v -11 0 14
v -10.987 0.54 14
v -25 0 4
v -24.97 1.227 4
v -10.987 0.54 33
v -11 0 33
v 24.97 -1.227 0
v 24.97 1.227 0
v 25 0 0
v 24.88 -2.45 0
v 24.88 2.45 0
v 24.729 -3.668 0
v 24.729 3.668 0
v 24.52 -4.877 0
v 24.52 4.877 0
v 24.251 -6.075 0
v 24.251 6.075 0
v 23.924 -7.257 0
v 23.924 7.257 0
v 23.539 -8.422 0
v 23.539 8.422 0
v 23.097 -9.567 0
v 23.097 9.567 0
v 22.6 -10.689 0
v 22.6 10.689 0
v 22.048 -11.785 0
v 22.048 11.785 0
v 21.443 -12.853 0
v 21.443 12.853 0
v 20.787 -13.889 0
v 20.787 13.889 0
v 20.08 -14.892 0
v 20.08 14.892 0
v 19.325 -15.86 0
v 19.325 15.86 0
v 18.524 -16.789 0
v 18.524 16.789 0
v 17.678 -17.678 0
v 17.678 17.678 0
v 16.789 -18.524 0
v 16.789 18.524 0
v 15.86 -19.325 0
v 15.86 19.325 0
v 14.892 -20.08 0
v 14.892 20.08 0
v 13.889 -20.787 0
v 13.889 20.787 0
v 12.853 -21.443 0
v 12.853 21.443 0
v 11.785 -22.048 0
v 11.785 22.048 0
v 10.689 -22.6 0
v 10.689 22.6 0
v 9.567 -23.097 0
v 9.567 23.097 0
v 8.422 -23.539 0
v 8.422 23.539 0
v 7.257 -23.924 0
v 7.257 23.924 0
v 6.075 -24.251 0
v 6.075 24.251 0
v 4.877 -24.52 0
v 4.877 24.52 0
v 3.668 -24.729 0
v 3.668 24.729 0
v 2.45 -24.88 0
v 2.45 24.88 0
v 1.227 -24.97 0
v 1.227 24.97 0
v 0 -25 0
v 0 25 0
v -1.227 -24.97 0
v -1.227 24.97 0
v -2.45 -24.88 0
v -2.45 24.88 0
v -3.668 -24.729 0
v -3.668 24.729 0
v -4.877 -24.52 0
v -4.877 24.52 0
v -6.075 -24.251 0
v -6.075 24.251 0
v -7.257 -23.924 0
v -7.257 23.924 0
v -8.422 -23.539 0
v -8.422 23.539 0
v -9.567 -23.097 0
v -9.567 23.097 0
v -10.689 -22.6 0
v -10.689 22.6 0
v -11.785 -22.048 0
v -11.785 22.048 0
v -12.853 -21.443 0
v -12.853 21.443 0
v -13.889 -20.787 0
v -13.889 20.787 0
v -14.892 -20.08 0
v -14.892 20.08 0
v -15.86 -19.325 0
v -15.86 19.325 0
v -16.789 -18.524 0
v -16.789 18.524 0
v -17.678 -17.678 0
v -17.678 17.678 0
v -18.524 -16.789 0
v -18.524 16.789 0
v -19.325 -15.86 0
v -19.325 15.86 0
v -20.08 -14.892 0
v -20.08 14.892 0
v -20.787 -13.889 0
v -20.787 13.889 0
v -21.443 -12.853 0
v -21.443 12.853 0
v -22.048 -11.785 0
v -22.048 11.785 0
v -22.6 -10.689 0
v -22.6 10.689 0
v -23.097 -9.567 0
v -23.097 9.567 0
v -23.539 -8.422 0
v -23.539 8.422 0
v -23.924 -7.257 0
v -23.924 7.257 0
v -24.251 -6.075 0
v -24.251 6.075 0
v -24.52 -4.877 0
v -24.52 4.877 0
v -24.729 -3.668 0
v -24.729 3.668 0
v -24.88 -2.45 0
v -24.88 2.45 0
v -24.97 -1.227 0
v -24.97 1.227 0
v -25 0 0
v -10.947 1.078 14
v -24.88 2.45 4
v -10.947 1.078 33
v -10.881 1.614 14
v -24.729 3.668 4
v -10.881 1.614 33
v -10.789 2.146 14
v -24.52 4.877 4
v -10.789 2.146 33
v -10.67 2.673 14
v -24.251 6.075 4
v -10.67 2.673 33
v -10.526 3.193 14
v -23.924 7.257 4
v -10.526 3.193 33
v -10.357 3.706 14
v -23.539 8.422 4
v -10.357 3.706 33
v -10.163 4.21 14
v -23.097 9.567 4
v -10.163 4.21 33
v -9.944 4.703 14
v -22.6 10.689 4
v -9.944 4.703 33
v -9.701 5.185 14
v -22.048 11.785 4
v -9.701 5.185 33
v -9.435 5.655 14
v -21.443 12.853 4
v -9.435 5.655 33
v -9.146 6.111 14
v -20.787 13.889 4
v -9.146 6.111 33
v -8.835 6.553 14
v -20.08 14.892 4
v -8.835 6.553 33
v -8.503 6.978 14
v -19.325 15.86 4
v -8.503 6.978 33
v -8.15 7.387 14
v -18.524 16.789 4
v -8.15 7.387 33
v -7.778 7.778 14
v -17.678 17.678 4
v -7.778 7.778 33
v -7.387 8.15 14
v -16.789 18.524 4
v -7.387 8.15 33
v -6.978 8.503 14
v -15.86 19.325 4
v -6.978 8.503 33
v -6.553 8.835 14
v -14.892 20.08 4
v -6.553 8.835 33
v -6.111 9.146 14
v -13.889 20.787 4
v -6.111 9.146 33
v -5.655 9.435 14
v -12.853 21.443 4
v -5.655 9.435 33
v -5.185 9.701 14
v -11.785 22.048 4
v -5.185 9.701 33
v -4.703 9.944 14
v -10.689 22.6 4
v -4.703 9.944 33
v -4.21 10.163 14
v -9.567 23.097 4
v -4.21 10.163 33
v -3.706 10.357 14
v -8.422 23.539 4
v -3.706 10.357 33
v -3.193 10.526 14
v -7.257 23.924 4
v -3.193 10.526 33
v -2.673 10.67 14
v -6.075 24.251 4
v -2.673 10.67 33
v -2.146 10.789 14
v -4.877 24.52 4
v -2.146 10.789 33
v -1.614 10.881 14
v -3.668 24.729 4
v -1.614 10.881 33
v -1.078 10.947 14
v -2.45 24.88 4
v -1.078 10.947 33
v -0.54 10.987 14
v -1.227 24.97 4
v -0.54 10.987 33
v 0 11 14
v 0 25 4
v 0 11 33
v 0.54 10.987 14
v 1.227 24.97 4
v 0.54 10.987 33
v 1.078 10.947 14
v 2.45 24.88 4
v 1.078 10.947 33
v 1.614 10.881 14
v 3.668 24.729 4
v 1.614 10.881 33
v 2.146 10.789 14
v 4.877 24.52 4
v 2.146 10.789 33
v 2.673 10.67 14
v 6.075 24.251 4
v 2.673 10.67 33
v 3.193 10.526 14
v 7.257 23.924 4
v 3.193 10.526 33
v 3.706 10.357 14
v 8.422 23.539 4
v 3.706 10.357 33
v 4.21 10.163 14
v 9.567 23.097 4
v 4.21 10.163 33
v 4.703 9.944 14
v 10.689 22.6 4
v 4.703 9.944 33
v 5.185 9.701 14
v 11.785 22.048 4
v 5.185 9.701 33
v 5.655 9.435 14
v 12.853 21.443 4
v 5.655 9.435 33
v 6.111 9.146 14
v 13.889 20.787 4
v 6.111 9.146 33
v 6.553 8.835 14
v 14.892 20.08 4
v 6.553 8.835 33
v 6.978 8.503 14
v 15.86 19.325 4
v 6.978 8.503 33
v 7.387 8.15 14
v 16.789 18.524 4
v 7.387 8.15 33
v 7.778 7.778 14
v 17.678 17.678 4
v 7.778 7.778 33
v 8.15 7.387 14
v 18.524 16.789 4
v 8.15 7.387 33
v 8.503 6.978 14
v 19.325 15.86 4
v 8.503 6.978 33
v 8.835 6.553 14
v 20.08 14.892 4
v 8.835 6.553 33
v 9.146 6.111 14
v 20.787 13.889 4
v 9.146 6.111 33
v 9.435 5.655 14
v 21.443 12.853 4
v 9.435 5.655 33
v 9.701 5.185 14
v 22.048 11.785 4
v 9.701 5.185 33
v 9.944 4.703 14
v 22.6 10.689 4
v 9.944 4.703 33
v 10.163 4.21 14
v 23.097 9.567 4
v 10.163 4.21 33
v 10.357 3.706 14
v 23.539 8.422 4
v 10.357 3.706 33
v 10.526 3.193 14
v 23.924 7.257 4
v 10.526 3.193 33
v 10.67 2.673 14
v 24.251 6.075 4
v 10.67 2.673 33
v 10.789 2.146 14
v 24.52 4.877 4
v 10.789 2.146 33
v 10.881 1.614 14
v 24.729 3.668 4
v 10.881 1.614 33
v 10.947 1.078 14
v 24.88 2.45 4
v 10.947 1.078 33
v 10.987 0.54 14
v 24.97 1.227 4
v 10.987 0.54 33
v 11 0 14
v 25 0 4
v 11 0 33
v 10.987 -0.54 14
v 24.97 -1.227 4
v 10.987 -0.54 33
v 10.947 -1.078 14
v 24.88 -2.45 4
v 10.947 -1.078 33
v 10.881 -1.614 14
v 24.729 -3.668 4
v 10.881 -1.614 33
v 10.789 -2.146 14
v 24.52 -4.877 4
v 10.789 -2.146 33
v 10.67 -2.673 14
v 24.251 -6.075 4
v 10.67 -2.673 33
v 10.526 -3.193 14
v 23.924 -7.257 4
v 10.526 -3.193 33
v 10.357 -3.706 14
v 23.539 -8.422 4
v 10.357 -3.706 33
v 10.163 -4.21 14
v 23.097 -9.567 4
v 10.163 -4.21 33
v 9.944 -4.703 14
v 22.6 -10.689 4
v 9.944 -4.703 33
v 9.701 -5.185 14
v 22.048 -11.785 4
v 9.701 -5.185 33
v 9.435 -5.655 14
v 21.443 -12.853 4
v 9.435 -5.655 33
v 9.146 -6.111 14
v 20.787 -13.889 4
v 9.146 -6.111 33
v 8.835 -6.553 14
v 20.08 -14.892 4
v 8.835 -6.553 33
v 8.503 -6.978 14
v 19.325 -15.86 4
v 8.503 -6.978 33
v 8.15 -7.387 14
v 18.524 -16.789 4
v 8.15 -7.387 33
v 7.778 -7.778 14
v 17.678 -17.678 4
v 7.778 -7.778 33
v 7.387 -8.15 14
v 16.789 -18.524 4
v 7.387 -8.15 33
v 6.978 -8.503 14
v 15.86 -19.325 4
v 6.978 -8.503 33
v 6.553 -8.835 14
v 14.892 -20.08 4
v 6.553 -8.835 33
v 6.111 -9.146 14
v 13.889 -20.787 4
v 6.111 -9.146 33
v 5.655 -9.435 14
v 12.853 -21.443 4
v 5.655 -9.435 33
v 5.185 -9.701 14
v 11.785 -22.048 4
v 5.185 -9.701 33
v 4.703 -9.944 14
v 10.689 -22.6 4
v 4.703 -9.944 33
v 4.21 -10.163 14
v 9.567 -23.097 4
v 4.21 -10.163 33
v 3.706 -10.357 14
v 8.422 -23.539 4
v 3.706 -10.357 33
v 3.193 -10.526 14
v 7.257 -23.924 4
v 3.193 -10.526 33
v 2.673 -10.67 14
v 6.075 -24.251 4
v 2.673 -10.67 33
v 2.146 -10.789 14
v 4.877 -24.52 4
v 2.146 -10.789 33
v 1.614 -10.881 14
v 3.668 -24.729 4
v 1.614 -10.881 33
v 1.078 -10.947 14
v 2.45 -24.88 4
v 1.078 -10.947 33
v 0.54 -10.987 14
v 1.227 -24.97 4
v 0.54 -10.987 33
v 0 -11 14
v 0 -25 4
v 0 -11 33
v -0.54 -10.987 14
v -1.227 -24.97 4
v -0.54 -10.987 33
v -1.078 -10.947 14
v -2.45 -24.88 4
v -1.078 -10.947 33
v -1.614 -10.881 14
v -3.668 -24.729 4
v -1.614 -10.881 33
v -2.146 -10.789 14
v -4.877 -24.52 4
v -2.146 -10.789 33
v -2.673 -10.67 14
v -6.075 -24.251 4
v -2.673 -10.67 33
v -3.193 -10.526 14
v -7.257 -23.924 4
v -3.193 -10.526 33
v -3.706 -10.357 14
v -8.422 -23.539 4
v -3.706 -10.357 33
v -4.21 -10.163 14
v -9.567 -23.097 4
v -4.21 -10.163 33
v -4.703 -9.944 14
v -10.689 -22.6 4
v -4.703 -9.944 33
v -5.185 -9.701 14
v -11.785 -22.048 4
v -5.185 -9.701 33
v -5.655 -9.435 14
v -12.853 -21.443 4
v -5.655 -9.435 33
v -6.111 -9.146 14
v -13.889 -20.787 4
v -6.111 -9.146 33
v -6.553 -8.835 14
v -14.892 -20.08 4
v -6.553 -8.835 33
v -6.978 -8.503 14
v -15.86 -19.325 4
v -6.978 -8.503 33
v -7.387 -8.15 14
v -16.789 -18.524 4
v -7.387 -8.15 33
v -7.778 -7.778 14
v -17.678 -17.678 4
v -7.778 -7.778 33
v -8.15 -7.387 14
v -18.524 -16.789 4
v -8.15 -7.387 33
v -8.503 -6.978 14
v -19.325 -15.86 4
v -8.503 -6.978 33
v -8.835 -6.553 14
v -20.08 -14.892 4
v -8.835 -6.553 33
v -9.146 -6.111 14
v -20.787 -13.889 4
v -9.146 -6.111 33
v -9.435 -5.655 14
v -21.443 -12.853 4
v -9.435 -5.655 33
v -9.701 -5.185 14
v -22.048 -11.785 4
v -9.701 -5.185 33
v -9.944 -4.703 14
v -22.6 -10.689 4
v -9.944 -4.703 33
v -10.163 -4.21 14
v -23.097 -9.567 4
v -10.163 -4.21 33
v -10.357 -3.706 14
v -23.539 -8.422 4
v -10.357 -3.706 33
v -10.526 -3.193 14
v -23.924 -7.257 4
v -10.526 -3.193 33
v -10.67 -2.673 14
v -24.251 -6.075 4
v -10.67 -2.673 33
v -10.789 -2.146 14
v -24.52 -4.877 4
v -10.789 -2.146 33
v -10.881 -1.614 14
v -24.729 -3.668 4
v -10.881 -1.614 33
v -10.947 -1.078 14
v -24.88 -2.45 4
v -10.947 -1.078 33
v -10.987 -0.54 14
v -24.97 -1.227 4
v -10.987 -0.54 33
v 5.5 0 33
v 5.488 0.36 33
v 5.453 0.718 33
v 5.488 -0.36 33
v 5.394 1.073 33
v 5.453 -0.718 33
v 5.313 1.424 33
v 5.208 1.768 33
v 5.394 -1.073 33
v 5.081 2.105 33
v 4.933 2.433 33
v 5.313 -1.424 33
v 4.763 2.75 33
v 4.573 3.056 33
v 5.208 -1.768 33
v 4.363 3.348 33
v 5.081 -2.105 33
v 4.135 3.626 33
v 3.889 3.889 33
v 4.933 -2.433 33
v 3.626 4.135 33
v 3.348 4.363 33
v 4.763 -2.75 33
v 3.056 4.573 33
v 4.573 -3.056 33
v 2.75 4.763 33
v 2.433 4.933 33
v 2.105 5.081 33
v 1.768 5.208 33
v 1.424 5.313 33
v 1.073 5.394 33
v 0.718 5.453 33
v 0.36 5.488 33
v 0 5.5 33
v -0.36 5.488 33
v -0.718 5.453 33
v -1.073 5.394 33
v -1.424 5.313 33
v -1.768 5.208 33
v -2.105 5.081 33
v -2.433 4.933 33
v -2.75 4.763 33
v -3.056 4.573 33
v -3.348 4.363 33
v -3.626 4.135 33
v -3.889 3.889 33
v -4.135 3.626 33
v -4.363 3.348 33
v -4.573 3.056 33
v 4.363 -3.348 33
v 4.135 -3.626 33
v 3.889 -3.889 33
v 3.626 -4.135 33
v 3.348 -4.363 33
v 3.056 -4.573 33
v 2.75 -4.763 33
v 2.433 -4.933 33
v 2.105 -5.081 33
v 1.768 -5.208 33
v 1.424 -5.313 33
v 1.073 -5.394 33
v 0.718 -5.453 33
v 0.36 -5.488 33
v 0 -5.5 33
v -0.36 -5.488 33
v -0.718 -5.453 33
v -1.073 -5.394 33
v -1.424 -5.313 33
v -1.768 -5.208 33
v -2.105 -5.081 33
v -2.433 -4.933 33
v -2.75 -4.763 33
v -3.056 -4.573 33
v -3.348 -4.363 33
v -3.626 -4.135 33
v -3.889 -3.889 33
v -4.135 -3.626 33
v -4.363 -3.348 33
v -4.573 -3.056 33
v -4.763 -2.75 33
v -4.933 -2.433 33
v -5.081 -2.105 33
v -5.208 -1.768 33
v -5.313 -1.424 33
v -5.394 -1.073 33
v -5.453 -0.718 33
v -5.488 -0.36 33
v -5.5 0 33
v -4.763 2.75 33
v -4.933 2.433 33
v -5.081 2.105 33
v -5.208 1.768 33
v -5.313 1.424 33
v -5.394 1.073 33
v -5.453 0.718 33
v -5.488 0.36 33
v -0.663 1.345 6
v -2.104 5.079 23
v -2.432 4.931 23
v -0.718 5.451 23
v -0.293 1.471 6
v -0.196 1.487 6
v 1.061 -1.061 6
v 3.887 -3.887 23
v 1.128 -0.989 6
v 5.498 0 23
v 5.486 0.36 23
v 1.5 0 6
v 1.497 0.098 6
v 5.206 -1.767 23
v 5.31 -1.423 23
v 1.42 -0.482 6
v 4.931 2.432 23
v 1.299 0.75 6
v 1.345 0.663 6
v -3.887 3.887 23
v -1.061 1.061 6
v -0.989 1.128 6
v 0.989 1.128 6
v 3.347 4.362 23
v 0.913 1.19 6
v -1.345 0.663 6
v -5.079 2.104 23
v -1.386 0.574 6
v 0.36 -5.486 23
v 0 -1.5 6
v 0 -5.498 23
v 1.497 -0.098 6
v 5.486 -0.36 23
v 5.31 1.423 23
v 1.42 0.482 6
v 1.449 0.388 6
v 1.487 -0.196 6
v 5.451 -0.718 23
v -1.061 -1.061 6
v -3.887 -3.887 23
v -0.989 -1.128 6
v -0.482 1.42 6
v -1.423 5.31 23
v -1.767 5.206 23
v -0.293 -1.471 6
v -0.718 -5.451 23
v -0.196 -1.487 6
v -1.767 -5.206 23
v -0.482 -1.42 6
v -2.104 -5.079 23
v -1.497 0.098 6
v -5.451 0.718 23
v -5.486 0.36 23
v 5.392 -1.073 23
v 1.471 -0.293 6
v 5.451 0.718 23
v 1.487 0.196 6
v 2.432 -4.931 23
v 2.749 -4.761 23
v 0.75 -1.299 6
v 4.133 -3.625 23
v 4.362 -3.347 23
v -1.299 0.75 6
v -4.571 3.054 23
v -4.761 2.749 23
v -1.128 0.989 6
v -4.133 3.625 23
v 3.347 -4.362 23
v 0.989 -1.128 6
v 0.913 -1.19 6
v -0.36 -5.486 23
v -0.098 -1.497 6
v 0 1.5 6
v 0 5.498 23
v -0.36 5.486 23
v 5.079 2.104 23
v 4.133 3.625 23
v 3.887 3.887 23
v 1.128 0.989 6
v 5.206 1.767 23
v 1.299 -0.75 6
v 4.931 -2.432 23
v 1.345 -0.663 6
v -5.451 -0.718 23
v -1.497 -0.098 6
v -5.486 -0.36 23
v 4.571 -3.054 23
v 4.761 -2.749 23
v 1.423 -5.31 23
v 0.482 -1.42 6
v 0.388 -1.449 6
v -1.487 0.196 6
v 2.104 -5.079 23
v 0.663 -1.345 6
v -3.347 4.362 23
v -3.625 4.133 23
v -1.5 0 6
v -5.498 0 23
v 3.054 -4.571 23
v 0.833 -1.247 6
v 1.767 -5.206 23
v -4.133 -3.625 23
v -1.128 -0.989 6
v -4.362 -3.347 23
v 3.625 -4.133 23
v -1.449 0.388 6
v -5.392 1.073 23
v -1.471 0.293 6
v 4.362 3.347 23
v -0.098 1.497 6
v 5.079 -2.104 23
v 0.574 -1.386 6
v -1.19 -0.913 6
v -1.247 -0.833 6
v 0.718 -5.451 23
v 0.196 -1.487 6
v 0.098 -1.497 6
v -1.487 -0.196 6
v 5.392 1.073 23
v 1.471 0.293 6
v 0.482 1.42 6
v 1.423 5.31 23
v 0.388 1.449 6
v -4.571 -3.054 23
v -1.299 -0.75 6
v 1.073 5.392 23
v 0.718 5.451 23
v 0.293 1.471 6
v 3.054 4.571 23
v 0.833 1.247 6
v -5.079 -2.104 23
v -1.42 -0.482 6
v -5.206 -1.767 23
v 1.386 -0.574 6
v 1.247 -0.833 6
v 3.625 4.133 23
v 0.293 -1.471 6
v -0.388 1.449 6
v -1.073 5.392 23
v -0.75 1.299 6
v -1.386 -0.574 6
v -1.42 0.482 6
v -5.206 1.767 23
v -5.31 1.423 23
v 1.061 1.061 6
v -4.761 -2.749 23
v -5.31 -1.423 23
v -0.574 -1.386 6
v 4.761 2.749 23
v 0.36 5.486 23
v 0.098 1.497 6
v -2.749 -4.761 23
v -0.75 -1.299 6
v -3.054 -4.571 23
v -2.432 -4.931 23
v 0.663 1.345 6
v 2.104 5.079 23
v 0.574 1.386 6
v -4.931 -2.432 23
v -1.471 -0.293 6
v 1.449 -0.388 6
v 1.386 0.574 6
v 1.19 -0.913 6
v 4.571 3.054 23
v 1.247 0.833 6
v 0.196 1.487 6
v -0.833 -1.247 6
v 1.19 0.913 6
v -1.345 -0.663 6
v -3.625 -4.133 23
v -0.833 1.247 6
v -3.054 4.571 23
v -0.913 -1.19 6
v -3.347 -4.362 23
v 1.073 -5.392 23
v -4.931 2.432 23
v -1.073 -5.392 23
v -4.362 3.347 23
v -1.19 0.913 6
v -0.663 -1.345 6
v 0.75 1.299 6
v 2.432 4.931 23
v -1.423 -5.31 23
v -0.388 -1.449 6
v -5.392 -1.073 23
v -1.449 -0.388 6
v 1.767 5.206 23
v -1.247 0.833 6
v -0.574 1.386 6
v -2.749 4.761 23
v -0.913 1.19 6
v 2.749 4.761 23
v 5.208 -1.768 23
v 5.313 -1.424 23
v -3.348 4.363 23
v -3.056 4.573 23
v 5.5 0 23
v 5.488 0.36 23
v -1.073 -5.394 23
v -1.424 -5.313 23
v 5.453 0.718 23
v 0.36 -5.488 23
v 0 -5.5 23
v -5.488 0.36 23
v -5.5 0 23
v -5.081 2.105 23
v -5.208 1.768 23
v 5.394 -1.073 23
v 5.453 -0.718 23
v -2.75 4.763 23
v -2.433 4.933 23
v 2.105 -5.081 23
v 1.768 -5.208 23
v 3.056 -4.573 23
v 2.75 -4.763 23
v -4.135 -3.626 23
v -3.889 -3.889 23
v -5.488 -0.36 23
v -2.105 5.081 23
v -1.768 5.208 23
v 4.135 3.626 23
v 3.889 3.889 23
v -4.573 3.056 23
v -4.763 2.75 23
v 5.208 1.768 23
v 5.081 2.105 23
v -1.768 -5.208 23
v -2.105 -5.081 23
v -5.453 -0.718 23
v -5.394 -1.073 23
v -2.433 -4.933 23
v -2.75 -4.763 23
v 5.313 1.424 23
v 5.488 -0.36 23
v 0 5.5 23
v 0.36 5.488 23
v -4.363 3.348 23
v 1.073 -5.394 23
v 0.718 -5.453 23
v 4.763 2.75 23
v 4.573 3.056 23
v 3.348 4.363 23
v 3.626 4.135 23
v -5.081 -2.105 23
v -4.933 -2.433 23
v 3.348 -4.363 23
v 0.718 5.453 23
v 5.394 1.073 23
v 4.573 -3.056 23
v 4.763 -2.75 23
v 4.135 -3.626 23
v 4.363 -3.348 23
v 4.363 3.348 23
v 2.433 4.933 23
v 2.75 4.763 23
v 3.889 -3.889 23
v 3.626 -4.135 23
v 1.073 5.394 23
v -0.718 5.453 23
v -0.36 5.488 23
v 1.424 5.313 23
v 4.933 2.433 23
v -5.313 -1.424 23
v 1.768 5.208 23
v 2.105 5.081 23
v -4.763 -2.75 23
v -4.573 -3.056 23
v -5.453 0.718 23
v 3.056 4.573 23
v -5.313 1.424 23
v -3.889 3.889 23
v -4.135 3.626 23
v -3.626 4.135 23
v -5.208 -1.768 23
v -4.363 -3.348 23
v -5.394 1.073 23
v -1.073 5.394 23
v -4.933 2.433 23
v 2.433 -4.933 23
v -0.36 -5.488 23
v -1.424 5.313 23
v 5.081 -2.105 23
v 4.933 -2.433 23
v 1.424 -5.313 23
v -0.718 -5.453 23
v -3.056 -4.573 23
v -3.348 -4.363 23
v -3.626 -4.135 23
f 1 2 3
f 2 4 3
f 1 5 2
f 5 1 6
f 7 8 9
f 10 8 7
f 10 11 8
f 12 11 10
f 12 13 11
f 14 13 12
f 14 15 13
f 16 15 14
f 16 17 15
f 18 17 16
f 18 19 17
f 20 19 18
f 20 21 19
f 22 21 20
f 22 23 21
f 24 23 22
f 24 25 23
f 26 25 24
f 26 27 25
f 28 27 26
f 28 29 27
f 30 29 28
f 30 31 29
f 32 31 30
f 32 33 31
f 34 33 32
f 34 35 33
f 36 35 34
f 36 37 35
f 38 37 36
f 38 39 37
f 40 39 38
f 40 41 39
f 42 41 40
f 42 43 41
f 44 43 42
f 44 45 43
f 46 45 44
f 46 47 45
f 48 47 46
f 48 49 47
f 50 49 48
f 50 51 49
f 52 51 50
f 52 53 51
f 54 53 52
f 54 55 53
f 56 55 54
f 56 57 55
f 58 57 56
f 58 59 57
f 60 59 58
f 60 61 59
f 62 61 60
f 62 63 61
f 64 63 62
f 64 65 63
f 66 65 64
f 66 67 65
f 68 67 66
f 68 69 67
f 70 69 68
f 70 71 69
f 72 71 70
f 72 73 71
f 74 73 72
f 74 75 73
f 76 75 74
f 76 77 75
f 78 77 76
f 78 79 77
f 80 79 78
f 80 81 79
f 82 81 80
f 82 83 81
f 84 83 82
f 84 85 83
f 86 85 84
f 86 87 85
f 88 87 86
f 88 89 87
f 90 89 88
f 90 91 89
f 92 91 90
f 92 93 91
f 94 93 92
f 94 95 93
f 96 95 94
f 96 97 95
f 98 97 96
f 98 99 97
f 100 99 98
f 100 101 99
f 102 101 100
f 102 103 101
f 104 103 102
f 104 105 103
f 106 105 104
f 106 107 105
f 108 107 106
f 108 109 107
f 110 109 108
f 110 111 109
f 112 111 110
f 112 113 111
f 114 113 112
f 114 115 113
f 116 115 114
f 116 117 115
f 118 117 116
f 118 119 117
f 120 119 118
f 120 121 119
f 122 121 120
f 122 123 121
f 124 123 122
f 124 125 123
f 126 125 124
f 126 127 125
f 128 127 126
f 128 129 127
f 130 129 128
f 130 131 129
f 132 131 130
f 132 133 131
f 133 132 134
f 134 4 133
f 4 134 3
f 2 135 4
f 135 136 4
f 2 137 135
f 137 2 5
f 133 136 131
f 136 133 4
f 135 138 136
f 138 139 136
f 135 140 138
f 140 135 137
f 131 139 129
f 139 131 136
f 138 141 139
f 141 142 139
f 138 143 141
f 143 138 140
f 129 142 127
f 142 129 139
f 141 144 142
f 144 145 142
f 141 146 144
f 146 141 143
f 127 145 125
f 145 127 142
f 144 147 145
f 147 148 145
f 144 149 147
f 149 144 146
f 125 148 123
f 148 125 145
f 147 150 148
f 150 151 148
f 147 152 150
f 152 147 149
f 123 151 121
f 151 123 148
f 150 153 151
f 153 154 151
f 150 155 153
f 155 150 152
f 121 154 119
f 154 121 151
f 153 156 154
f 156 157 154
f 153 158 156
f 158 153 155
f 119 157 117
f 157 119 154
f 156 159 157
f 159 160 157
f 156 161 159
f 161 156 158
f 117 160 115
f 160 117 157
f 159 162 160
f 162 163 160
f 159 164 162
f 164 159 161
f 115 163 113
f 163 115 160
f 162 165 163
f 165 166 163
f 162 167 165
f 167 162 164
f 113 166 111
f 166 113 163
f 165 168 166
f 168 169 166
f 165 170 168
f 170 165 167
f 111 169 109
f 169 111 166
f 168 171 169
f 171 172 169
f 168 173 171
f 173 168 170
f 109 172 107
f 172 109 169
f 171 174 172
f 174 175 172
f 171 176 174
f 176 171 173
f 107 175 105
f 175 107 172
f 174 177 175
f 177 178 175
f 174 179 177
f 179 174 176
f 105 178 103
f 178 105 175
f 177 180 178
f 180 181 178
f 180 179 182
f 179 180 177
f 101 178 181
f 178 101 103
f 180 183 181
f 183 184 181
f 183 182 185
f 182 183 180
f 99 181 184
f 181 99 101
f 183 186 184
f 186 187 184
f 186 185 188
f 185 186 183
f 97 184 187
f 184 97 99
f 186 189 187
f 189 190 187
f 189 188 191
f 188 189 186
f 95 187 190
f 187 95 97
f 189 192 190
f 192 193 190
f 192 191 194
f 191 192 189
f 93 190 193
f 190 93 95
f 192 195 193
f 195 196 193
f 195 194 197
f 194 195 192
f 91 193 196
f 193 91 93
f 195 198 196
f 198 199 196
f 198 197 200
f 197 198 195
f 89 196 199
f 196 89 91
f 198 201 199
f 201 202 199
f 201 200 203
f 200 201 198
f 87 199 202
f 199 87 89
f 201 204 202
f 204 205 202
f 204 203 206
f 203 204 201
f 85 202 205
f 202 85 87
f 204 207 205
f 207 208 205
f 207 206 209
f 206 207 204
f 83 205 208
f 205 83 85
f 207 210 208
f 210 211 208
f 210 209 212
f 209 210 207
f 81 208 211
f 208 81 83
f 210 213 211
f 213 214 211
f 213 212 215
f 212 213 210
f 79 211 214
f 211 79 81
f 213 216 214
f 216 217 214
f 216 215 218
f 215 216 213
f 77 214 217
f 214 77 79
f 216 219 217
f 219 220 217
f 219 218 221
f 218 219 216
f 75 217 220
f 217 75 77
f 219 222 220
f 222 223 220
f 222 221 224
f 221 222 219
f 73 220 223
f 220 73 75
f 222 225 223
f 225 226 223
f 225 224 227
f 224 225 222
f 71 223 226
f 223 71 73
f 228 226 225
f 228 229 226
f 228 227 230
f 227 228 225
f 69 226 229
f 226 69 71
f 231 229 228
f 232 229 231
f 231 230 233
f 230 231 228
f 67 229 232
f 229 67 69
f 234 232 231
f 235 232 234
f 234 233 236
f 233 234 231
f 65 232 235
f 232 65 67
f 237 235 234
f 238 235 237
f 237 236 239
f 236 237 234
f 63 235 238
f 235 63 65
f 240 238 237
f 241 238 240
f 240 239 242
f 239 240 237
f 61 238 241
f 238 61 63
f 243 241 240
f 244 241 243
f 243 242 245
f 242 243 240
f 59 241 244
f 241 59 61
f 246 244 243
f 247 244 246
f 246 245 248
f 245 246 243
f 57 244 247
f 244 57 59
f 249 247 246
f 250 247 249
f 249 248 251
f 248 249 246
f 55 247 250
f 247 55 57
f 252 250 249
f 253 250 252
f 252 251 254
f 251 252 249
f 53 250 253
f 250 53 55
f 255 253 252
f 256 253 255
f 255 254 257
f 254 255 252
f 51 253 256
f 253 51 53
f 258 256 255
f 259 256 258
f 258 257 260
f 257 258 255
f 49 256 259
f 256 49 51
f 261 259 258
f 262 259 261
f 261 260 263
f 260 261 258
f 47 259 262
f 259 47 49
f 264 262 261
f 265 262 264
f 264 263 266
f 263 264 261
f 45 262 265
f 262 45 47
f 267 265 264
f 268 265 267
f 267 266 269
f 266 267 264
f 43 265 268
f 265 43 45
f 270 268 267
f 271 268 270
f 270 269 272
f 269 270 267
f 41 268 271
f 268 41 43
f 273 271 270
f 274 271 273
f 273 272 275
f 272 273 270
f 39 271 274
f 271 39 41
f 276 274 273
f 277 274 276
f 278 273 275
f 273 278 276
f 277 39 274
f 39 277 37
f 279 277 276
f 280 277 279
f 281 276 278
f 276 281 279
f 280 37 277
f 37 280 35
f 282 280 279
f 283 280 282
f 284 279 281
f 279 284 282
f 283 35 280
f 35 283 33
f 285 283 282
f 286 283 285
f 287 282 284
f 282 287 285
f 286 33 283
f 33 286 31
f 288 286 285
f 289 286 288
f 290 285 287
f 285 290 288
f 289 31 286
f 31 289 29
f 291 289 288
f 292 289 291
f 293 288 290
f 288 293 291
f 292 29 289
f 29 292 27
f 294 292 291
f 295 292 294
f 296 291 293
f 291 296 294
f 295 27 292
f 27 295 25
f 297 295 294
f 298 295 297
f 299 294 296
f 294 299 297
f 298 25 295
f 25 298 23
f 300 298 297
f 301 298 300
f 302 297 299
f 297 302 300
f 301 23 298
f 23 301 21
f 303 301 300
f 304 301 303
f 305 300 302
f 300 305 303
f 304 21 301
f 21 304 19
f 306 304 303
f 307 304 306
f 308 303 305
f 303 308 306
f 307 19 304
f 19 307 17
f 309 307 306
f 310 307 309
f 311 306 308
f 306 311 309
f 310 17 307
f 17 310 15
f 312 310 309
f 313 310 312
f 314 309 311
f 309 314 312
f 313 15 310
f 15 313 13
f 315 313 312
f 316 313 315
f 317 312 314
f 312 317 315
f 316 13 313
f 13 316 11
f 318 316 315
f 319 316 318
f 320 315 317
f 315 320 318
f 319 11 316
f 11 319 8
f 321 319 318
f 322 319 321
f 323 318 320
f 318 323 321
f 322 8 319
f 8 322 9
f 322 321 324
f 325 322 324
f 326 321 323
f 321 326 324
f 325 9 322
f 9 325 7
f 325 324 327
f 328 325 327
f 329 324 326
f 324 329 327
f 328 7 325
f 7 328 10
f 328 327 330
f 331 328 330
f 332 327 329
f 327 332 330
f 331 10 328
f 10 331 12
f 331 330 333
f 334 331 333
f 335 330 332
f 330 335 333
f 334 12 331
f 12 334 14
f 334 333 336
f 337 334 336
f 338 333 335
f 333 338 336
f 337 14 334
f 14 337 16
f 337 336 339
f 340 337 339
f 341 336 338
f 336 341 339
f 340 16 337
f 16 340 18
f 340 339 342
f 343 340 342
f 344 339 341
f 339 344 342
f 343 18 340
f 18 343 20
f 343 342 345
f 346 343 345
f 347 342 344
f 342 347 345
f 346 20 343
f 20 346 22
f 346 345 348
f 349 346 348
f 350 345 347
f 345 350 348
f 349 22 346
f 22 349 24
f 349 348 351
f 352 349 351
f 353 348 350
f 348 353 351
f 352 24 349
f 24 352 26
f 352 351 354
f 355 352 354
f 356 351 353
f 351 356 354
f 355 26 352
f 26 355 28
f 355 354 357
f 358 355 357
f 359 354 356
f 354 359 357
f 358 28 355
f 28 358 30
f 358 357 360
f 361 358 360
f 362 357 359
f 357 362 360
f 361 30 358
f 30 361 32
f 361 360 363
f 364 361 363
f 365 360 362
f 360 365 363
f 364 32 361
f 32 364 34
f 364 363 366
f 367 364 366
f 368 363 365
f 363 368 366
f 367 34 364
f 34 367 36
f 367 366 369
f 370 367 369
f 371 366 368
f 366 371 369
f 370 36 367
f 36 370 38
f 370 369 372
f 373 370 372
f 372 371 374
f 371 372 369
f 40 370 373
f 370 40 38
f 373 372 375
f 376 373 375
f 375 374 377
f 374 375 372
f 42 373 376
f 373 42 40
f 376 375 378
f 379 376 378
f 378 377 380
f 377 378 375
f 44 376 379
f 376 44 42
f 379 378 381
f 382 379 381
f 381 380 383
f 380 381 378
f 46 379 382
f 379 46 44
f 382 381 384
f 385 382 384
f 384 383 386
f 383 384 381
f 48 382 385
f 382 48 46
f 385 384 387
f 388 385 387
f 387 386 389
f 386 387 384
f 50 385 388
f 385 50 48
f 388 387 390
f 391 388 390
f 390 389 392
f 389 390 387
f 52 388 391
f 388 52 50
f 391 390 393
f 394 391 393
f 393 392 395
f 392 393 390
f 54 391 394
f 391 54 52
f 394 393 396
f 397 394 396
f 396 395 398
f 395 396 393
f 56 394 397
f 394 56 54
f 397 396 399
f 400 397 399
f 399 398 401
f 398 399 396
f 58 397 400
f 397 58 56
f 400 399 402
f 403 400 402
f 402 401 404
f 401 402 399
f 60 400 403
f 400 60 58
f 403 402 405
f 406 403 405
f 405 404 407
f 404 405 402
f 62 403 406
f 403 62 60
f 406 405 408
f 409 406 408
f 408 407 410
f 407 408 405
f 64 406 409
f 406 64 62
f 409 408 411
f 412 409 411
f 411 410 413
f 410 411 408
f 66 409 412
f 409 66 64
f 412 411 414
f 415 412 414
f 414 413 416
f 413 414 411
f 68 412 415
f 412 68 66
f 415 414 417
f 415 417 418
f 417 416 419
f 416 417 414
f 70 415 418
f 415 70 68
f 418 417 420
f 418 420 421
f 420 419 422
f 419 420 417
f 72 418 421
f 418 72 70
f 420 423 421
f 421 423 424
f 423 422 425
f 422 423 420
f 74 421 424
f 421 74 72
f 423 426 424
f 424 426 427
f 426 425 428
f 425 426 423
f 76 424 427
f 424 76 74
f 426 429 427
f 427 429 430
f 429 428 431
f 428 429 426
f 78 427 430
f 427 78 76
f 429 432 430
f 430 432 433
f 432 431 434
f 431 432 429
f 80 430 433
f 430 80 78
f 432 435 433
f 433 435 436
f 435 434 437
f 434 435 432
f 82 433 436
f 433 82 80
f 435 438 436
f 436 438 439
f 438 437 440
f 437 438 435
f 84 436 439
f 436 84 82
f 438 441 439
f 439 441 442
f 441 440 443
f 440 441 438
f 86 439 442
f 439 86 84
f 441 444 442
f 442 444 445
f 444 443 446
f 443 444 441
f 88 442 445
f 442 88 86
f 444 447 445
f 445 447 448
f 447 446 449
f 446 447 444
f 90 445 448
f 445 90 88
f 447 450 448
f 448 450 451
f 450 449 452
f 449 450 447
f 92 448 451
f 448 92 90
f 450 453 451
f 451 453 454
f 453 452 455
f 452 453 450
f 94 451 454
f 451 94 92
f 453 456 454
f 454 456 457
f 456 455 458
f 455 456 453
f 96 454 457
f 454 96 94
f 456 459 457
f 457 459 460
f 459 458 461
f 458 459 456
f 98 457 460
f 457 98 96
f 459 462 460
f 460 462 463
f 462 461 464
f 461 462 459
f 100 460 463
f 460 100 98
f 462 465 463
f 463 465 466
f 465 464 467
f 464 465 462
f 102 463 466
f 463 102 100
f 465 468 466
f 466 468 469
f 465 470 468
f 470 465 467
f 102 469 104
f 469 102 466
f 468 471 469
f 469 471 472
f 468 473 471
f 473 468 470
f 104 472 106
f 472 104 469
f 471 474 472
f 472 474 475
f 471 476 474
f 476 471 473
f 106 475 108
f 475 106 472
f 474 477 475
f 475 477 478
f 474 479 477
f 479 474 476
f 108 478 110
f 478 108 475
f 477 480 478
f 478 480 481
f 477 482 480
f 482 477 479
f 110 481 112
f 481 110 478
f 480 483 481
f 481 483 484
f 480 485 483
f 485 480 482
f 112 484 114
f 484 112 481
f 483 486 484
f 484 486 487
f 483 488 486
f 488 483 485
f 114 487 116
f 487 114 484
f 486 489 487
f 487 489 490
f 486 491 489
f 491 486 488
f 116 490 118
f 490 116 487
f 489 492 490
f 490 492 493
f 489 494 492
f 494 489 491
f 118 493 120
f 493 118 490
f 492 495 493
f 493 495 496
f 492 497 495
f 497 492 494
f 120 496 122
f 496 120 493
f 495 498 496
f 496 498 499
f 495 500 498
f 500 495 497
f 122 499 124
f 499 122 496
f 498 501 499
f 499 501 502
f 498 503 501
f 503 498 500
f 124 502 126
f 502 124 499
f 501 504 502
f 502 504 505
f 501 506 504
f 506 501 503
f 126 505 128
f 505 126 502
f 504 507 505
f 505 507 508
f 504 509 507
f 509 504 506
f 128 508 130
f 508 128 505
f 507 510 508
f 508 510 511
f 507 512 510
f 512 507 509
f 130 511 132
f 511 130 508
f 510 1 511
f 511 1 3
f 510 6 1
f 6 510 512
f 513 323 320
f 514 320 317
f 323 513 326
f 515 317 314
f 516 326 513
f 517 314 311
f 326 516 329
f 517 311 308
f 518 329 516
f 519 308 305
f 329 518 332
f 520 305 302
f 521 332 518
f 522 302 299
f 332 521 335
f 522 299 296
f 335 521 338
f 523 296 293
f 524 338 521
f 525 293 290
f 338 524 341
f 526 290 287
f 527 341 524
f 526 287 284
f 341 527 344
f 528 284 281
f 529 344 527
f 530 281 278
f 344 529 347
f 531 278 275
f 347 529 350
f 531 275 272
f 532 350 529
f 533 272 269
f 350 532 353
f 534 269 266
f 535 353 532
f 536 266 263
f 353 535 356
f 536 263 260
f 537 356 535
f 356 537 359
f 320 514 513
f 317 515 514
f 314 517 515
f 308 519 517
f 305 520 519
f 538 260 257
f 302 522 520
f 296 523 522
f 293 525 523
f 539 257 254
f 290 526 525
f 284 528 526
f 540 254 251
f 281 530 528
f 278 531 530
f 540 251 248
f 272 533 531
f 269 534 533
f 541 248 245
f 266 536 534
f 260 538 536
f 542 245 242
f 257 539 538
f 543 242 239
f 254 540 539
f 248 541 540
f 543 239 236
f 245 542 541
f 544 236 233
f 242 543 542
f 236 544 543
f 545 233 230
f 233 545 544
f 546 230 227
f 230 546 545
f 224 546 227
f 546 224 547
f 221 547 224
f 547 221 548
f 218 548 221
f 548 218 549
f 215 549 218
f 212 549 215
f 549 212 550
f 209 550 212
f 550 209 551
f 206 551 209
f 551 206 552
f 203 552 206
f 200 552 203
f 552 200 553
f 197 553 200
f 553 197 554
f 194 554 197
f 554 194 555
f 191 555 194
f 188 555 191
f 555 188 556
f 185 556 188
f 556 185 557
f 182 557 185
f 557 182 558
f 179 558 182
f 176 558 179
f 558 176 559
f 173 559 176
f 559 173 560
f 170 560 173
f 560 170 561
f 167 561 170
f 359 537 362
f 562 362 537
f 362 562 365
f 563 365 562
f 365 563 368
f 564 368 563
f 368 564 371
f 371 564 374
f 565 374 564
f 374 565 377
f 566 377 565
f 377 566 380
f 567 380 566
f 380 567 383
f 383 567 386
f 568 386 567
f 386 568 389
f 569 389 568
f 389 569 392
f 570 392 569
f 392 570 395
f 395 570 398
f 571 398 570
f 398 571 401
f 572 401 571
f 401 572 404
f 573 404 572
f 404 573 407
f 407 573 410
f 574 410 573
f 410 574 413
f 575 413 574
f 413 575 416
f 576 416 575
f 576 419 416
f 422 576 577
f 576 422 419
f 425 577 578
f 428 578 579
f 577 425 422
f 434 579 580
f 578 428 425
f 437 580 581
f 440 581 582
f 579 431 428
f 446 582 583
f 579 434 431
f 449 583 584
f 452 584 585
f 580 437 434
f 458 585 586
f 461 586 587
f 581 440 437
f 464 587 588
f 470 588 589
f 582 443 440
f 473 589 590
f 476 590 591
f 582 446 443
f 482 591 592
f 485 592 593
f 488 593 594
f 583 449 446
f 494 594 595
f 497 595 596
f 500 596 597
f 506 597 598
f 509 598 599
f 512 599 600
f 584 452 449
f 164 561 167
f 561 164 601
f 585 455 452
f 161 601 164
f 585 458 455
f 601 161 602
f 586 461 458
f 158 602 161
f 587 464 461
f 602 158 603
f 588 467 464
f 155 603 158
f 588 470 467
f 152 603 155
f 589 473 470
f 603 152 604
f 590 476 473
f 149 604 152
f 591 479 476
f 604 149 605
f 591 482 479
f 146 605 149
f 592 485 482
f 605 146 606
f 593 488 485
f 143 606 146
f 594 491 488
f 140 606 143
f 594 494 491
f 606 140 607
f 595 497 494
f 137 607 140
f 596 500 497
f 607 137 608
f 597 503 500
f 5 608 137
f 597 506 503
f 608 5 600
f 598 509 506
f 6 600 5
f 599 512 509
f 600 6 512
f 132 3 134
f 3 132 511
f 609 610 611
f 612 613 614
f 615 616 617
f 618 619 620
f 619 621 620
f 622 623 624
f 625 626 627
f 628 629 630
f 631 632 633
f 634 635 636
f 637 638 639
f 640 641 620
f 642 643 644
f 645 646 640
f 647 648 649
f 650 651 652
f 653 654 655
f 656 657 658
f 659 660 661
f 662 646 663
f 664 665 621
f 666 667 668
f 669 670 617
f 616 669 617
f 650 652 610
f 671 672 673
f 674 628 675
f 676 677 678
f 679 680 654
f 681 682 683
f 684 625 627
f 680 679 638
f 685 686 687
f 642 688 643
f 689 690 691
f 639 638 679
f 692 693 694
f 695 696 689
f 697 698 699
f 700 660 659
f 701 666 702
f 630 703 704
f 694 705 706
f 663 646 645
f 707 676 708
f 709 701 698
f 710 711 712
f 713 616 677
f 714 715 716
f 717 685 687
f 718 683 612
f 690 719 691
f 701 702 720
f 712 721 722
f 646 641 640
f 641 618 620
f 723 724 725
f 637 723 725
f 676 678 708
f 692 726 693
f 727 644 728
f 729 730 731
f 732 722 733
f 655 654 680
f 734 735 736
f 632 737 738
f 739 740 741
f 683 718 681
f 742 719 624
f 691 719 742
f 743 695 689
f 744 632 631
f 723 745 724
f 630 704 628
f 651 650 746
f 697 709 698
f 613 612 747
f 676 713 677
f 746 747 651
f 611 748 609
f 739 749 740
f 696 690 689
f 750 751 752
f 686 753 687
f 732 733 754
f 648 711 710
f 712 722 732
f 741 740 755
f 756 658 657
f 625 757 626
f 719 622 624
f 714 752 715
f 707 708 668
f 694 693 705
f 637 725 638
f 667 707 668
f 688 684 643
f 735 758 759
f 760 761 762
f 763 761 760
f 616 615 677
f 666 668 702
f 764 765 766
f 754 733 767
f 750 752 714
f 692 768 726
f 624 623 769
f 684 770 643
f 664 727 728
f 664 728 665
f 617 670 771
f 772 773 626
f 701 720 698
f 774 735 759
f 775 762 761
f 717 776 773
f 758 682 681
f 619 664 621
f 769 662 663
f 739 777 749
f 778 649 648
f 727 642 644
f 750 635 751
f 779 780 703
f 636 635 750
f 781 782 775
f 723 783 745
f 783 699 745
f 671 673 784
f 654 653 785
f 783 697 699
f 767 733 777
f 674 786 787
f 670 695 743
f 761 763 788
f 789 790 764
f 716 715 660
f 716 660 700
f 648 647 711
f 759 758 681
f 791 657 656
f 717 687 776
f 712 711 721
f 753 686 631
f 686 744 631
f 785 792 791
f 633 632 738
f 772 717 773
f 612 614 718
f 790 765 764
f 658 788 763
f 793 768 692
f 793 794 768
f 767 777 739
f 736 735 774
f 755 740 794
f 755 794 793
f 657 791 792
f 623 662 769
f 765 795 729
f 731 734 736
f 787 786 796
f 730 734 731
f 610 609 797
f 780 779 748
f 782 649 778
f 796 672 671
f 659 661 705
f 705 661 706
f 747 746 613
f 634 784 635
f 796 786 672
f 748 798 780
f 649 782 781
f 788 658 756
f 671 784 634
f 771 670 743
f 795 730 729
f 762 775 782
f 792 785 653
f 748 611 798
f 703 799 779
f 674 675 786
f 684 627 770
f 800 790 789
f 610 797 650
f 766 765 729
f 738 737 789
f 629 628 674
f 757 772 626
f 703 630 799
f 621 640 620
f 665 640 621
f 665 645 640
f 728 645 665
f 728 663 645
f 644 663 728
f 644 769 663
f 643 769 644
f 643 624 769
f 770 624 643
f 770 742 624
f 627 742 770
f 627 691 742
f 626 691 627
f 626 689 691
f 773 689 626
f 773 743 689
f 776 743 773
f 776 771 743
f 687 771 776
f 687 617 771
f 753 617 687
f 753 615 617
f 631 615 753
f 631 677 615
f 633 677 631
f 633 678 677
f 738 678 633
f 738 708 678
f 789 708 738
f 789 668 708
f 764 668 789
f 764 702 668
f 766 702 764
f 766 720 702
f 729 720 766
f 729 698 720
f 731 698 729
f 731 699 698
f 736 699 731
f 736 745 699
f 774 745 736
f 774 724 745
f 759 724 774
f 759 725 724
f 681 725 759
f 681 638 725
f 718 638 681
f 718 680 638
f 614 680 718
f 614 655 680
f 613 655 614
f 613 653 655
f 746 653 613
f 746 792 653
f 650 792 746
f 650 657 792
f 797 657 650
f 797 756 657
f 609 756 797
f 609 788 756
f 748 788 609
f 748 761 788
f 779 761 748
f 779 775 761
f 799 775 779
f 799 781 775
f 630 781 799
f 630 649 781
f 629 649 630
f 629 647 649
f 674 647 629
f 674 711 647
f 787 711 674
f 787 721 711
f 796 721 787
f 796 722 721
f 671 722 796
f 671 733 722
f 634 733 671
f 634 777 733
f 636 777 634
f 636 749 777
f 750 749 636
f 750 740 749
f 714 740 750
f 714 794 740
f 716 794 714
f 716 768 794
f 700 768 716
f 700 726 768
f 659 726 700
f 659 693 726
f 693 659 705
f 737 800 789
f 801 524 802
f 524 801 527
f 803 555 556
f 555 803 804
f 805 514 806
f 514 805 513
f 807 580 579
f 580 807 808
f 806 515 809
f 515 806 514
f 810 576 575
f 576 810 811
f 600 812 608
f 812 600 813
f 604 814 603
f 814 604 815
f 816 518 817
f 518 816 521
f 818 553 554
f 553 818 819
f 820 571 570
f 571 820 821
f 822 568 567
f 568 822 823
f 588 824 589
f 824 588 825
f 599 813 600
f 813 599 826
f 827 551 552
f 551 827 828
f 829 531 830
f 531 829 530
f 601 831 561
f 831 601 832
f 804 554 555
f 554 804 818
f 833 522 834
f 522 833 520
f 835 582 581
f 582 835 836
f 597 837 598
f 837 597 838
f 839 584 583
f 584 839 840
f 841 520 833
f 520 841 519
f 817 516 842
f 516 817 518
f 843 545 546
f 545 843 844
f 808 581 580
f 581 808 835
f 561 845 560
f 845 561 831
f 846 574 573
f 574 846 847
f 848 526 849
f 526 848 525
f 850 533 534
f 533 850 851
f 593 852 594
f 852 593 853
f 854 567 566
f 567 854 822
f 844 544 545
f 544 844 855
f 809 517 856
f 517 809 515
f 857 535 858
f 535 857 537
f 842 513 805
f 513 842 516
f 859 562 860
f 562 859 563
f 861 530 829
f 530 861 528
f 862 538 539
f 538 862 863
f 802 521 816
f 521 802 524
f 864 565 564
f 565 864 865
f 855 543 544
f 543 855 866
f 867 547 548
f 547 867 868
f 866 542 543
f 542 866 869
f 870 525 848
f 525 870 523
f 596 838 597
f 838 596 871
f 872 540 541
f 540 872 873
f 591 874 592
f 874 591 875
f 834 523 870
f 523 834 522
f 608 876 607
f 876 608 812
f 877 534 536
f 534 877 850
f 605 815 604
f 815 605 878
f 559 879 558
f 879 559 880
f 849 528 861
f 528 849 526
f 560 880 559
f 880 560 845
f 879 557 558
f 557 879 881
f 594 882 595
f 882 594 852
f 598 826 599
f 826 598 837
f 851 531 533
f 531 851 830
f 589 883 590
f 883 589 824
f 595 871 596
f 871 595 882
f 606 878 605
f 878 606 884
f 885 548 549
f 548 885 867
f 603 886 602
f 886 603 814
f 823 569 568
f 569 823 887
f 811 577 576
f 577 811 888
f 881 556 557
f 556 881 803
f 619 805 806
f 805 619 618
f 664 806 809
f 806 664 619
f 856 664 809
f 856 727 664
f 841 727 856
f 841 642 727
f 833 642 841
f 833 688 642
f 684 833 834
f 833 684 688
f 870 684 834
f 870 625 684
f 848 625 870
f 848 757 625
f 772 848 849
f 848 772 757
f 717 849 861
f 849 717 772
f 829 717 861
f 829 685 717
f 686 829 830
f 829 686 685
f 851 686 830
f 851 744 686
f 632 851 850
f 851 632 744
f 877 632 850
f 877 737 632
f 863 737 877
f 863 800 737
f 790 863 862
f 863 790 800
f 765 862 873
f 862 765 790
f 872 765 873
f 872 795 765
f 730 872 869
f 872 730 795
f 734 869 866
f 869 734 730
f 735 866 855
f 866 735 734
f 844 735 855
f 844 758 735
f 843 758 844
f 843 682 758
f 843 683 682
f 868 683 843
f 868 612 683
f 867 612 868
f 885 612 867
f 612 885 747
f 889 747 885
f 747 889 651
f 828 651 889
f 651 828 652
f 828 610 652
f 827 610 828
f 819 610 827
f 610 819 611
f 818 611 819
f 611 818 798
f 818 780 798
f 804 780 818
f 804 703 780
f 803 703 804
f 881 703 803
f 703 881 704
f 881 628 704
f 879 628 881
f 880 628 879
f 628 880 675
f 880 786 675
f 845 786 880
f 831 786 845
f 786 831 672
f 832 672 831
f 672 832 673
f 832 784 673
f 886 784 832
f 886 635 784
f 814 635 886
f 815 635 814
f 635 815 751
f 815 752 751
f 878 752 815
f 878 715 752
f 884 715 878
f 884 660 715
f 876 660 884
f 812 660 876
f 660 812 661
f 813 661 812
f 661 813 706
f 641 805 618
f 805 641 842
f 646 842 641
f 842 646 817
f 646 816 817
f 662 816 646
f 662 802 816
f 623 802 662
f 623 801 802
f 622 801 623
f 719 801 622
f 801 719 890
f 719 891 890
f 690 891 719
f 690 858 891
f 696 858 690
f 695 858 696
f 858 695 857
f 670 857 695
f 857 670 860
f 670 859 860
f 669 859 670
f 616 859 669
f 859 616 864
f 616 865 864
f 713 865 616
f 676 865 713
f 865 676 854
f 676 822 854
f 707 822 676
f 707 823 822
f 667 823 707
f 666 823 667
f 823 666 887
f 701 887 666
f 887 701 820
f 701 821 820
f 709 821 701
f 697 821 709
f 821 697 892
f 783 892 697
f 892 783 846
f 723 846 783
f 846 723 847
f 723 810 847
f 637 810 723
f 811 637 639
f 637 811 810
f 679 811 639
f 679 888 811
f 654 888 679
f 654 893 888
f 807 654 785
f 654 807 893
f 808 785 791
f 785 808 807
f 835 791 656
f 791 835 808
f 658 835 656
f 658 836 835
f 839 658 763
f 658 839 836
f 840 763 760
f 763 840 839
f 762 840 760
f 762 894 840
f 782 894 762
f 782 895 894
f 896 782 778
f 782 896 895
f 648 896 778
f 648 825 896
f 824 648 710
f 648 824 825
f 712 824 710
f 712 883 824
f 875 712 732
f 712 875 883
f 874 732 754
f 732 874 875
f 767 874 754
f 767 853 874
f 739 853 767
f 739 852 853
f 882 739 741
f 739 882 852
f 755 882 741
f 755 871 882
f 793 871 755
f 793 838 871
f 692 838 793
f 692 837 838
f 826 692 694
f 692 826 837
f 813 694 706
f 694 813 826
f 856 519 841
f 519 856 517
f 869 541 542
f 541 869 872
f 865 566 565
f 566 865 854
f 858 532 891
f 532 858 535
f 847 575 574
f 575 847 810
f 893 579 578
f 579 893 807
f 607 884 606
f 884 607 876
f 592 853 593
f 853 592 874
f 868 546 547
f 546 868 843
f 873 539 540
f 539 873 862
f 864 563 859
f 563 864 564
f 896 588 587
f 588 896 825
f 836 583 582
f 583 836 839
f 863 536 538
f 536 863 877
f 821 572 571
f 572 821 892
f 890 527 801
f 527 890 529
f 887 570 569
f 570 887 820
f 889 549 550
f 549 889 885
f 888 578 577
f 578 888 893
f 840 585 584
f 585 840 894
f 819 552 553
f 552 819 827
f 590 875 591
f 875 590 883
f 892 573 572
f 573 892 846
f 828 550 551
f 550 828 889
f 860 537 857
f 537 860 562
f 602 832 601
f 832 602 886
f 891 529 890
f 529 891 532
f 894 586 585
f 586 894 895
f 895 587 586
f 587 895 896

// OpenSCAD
// KNOWN-WRONG PART (must fail): the viewing window is missing
// Weighing stand that holds one 1.5 mL microcentrifuge tube upright on a balance pan
// Category: quick fixes. A revolved stand (base disc, cone, column) with a seat that follows the
// tube's conical tip, and a viewing window through the column wall on the +X side.
// Print: PLA or PETG, standing up, 0.2 mm layers. Tare the balance with the stand on it.
// SPDX-License-Identifier: CERN-OHL-P-2.0

/* [Stand] */
base_d = 50;  base_h = 4;       // disc z = 0 .. 4
col_d = 22;   cone_top = 14;    // cone 50 -> 22 mm from z = 4 to 14
height = 33;                    // column from z = 14 to 33
seat_d = 11;  seat_cyl_z = 23;  // 11 mm from the top down to z = 23 ...
tip_d = 3;    tip_z = 6;        // ... then a cone narrowing to 3 mm at z = 6
win_w = 4;    win_z = [18, 30]; // viewing window through the +X wall

/* [Hidden] */
$fn = 128;
eps = 0.01;

difference() {
    rotate_extrude() polygon([[0, 0], [base_d / 2, 0], [base_d / 2, base_h], [col_d / 2, cone_top],
                              [col_d / 2, height], [0, height]]);
    translate([0, 0, tip_z]) cylinder(d1 = tip_d, d2 = seat_d, h = seat_cyl_z - tip_z + eps, $fn = 96);
    translate([0, 0, seat_cyl_z]) cylinder(d = seat_d, h = height - seat_cyl_z + 1, $fn = 96);
}
